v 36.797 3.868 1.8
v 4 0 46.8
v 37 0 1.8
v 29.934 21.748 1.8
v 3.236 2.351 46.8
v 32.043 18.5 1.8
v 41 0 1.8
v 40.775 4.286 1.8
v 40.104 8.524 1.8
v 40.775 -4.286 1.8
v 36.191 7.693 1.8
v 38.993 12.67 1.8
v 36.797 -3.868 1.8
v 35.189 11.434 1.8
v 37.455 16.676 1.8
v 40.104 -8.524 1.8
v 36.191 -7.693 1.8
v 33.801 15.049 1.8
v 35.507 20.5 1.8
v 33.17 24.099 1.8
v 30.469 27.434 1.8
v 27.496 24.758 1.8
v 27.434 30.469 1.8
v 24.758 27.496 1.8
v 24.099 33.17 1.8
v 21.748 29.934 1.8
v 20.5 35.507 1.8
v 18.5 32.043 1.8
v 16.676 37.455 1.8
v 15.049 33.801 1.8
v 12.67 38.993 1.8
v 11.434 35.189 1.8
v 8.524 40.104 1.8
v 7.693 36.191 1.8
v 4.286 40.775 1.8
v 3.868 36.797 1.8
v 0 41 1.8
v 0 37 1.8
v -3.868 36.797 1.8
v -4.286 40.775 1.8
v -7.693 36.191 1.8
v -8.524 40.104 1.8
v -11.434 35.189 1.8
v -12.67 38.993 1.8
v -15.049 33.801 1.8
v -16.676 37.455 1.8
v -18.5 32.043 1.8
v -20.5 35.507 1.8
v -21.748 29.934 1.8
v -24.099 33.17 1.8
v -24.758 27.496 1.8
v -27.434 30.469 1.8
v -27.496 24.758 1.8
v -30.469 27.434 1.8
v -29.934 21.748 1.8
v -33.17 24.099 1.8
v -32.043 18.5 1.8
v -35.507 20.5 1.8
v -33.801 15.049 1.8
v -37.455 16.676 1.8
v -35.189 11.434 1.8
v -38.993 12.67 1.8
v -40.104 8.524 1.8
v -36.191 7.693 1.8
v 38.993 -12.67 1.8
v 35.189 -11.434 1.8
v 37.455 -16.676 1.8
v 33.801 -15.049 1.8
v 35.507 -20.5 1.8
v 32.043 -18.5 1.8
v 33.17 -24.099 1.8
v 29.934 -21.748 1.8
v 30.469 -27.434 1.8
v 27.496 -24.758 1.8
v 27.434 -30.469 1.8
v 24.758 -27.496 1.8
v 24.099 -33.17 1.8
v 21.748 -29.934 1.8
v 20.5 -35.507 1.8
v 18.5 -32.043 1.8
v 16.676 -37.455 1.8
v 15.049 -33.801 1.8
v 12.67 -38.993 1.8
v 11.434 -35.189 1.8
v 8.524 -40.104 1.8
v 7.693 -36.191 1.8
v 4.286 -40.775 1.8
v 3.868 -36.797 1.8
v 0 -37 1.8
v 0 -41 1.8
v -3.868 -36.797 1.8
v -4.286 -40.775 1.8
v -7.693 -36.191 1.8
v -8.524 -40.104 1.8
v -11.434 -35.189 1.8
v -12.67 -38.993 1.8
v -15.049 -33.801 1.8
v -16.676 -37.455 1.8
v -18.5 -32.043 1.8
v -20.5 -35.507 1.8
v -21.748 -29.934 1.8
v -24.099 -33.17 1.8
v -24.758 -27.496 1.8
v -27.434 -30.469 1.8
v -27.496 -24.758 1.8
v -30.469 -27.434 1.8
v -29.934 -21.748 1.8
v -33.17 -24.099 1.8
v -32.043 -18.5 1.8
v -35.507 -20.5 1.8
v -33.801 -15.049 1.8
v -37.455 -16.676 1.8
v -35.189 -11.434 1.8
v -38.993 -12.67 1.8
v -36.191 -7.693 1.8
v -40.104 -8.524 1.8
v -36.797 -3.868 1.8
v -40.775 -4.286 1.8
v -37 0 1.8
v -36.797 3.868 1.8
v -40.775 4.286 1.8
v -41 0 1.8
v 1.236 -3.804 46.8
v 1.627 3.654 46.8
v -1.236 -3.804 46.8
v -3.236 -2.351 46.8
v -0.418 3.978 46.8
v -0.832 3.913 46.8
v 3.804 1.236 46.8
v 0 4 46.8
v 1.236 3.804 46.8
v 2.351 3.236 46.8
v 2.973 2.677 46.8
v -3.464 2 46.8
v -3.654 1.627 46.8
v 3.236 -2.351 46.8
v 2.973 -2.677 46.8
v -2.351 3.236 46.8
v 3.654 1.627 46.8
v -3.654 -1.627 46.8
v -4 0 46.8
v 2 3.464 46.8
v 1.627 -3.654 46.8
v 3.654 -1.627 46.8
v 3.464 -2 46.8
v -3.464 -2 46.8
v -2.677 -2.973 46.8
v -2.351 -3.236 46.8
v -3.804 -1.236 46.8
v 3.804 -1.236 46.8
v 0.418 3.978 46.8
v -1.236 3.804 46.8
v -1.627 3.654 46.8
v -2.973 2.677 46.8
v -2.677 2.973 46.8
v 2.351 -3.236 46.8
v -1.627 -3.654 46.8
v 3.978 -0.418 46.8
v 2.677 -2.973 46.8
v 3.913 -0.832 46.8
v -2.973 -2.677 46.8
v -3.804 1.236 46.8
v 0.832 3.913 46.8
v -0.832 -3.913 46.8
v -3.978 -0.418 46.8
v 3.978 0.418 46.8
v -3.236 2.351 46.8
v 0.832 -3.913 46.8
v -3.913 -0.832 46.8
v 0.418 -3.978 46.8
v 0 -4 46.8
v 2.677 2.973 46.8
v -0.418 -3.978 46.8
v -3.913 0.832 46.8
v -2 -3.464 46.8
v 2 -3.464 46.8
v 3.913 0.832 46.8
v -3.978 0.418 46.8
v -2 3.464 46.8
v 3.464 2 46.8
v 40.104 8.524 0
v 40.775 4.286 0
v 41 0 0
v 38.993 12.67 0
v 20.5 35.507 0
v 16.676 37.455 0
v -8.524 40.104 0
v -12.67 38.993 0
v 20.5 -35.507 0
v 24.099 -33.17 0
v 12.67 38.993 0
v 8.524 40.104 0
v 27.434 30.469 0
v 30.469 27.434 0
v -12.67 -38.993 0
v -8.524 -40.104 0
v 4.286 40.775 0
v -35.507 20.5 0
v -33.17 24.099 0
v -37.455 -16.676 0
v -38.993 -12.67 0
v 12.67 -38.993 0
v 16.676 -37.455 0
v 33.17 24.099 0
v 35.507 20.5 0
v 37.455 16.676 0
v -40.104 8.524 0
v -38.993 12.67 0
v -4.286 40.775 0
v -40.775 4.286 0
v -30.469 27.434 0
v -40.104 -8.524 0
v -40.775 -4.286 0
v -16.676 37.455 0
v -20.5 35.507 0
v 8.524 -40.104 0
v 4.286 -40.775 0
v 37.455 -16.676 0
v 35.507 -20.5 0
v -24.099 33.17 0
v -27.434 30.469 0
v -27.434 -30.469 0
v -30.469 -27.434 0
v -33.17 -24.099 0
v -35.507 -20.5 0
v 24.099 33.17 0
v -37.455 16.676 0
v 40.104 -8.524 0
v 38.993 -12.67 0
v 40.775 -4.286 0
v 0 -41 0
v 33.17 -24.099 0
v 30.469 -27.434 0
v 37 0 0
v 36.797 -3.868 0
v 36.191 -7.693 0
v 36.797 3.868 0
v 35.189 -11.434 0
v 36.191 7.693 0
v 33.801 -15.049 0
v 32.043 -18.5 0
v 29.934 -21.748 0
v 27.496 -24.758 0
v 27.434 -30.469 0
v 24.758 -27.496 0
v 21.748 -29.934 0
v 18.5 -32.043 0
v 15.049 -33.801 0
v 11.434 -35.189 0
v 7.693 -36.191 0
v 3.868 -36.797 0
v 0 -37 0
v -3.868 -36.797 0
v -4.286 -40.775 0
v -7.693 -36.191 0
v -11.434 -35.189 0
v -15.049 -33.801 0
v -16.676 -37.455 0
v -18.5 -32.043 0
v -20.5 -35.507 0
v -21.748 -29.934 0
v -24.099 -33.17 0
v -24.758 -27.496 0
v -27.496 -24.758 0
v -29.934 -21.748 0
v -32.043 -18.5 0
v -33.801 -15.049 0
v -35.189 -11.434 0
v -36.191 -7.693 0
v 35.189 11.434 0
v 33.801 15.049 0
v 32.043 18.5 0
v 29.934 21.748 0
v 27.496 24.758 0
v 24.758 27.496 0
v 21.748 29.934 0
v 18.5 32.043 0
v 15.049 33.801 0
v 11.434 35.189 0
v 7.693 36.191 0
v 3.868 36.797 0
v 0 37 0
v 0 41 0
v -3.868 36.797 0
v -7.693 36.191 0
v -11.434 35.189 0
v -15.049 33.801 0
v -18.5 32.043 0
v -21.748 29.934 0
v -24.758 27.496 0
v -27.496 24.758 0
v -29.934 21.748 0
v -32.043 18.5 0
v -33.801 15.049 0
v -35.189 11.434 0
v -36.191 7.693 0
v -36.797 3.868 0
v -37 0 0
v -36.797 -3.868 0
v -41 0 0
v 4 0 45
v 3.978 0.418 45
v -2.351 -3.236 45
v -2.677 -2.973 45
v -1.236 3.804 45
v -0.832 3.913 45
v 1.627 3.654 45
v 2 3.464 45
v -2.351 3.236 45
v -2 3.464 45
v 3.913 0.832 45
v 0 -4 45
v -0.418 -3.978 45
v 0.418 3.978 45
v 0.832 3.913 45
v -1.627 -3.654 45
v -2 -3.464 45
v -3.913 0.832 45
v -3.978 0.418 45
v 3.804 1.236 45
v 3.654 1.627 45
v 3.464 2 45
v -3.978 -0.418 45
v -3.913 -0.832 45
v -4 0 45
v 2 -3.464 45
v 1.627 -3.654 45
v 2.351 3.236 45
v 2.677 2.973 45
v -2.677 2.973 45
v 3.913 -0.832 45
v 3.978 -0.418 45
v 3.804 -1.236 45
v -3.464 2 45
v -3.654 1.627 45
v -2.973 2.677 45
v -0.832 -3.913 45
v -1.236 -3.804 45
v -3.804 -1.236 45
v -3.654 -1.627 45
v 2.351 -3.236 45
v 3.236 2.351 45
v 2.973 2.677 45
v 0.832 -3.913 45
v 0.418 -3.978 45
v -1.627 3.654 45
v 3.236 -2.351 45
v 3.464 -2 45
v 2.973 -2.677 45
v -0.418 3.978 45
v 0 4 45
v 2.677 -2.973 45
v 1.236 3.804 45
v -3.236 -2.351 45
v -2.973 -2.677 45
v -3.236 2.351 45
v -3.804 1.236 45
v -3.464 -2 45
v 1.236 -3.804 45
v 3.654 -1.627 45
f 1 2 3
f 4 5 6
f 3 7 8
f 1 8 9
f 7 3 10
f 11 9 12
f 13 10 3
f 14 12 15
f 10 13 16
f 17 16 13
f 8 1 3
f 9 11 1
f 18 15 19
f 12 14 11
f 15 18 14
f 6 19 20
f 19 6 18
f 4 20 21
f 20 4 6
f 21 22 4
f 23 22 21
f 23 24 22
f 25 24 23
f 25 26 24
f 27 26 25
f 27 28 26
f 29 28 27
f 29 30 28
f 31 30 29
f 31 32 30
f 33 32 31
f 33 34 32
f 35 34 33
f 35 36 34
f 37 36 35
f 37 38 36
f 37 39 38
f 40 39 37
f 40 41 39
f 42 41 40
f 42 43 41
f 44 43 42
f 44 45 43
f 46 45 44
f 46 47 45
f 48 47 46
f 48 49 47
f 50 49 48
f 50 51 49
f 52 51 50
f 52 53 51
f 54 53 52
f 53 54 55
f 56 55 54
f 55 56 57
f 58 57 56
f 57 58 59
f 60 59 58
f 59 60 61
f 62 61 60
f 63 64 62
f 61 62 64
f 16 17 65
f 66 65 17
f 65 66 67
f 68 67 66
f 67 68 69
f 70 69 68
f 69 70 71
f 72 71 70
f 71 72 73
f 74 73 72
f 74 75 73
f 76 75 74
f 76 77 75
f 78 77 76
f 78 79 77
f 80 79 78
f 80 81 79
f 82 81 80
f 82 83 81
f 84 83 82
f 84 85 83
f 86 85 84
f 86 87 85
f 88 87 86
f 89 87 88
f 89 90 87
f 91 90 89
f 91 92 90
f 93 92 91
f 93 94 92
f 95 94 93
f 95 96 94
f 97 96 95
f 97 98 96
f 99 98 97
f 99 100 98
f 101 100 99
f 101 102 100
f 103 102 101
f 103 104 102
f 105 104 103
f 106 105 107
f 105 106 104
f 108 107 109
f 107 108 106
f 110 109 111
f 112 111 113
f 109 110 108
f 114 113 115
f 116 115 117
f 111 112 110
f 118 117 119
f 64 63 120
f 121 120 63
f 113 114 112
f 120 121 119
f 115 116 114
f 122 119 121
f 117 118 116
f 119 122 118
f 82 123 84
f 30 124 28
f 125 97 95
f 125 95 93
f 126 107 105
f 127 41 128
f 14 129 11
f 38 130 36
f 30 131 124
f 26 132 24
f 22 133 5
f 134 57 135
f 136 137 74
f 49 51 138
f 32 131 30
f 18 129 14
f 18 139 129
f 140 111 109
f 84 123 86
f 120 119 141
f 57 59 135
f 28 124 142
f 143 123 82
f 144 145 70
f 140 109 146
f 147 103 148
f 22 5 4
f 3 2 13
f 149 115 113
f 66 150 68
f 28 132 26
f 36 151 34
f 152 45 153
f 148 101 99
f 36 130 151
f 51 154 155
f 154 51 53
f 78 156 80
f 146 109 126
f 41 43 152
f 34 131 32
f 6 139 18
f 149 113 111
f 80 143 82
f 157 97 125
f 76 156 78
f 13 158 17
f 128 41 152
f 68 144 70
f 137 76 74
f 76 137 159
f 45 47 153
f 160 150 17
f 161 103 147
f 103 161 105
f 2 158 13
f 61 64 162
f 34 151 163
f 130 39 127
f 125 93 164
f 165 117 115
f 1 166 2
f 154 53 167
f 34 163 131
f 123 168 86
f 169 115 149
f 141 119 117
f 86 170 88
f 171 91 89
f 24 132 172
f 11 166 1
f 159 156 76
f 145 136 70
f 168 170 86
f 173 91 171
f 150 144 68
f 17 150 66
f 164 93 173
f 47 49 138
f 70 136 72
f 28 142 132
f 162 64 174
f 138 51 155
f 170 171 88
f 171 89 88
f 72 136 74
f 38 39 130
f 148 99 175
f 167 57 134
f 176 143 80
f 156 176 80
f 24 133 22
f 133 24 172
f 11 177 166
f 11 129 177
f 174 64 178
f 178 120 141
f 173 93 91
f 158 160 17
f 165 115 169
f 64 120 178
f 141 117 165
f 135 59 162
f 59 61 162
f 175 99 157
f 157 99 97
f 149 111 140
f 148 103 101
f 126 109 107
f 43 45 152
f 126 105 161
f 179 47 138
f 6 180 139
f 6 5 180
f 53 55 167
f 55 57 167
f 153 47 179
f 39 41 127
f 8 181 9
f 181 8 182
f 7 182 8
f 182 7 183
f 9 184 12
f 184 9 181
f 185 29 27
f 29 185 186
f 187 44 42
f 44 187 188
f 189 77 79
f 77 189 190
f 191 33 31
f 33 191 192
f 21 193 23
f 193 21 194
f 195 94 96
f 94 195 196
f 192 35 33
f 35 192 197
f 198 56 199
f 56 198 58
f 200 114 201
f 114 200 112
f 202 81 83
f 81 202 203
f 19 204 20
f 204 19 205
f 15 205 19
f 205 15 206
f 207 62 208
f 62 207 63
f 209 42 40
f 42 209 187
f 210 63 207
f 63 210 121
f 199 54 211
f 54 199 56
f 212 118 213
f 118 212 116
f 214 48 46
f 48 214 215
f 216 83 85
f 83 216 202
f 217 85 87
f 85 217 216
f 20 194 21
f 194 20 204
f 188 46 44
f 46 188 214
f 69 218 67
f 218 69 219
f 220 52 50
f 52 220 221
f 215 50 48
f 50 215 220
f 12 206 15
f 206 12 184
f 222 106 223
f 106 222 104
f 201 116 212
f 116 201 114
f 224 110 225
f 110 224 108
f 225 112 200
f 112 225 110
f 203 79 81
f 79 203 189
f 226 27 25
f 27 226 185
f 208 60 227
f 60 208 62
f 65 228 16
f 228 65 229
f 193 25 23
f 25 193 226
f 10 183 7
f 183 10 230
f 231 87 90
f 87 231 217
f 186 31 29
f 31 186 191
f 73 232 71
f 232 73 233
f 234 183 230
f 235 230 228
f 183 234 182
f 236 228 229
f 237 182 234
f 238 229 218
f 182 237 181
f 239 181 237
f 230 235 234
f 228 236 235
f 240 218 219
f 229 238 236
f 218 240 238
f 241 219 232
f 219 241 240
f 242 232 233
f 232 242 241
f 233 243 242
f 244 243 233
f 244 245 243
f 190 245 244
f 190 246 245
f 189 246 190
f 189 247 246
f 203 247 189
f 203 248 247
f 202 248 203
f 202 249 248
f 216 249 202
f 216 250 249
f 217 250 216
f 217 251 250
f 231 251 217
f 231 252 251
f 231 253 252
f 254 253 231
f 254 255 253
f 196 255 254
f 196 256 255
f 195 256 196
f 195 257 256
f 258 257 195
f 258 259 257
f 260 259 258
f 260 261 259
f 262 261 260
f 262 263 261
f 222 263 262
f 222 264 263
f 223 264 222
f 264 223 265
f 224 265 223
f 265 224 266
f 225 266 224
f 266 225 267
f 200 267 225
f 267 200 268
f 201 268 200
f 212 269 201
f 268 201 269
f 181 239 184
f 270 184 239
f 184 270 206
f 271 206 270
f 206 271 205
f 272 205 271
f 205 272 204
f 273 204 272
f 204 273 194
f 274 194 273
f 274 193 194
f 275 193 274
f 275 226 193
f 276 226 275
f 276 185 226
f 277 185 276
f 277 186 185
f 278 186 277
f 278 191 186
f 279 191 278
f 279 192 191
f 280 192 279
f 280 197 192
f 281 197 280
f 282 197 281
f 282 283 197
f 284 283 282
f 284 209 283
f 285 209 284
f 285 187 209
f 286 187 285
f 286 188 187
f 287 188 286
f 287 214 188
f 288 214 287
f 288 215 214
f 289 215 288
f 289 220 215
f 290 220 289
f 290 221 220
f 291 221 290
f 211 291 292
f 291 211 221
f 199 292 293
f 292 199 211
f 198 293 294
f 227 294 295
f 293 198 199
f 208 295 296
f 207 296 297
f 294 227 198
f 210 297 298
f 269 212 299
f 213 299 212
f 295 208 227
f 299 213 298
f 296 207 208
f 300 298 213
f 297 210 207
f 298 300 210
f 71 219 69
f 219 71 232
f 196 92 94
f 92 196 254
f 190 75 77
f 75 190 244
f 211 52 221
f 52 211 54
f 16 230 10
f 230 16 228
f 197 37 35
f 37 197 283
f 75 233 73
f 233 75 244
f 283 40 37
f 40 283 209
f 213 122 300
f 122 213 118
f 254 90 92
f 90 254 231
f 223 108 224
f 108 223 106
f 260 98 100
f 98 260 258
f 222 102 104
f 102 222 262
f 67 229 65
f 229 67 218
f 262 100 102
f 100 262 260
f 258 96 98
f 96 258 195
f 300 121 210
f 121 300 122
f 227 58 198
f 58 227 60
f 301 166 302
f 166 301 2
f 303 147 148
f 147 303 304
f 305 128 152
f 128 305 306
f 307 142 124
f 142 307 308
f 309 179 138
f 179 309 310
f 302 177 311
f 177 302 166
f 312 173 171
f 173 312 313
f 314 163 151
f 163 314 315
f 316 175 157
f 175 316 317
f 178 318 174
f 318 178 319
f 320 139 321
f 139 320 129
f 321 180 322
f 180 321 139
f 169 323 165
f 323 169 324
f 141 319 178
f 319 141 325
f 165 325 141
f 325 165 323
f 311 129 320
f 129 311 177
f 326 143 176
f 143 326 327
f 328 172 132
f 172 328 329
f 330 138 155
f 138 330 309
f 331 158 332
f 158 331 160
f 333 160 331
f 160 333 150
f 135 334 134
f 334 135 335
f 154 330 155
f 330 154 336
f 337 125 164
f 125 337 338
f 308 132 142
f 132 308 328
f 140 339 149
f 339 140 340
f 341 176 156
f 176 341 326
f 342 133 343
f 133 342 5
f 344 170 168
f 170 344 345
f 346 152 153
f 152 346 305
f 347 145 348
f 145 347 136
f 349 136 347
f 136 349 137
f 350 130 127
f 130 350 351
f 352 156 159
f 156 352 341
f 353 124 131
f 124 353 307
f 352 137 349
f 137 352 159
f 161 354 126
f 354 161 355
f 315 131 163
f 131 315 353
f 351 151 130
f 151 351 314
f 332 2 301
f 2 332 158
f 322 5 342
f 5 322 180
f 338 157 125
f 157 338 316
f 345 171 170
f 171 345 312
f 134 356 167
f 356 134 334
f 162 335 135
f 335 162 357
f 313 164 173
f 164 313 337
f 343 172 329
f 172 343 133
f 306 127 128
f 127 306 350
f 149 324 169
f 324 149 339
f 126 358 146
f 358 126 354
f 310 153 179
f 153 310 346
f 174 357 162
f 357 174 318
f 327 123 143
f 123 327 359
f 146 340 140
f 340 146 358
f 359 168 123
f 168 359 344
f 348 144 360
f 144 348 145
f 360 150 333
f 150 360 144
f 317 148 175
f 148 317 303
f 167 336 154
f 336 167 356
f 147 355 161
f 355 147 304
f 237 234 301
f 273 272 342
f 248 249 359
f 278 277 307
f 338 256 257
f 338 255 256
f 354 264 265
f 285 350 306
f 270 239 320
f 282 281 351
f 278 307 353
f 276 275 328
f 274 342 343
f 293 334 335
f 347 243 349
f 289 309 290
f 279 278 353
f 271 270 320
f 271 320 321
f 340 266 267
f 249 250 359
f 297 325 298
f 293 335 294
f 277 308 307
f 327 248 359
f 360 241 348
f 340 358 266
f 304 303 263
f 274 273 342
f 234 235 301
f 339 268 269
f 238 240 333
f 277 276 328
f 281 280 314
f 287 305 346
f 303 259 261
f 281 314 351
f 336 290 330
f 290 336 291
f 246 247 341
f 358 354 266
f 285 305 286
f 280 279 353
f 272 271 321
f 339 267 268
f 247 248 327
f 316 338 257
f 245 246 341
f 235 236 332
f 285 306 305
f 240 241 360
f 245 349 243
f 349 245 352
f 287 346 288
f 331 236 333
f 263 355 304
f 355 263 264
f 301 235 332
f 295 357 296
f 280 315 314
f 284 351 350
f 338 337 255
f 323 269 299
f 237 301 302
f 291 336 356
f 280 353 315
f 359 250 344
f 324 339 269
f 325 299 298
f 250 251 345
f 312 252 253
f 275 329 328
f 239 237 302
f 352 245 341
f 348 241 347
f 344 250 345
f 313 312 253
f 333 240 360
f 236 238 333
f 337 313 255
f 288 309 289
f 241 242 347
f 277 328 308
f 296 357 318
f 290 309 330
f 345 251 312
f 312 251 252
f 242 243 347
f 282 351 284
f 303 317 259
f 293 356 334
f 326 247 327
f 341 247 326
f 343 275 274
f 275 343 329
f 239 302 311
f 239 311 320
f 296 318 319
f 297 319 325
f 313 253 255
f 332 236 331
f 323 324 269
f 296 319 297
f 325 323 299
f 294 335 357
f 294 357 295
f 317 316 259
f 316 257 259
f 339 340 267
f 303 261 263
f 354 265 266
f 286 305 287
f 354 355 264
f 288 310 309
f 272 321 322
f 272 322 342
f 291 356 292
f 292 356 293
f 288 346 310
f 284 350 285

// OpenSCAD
//ball jar gnat trap
//Joshua Case
//9-25-19
//a slow and painful death to all of these tiny vermin

verticalThickness = 1.8;    //Vertical Thickness of the entire part. 
funnelHeight = 45;          //Height of funnel above (below) top surface of jar. 
funnelBaseDiameter = 74;    //Jar Inner Diameter. allowance for measurement tolerance not included.
flareDiameter = 82;         //Jar Outer Diameter
holeDiameter = 8;
$fn=60;                     //Segments per rotation

difference(){
conePrimitive();
translate([0,0,-verticalThickness]) conePrimitive();
}




module conePrimitive(){


difference(){
    union(){
translate([0,0,verticalThickness]) rotate([0,0,0]) cylinder(h=funnelHeight,d1=funnelBaseDiameter,d2=holeDiameter);
translate([0,0,0]) rotate([0,0,0]) cylinder(h=verticalThickness,d=flareDiameter);
    }
translate([0,0,0]) rotate([0,0,0]) cylinder(h=funnelHeight+verticalThickness,d=holeDiameter);    
    
}
}
